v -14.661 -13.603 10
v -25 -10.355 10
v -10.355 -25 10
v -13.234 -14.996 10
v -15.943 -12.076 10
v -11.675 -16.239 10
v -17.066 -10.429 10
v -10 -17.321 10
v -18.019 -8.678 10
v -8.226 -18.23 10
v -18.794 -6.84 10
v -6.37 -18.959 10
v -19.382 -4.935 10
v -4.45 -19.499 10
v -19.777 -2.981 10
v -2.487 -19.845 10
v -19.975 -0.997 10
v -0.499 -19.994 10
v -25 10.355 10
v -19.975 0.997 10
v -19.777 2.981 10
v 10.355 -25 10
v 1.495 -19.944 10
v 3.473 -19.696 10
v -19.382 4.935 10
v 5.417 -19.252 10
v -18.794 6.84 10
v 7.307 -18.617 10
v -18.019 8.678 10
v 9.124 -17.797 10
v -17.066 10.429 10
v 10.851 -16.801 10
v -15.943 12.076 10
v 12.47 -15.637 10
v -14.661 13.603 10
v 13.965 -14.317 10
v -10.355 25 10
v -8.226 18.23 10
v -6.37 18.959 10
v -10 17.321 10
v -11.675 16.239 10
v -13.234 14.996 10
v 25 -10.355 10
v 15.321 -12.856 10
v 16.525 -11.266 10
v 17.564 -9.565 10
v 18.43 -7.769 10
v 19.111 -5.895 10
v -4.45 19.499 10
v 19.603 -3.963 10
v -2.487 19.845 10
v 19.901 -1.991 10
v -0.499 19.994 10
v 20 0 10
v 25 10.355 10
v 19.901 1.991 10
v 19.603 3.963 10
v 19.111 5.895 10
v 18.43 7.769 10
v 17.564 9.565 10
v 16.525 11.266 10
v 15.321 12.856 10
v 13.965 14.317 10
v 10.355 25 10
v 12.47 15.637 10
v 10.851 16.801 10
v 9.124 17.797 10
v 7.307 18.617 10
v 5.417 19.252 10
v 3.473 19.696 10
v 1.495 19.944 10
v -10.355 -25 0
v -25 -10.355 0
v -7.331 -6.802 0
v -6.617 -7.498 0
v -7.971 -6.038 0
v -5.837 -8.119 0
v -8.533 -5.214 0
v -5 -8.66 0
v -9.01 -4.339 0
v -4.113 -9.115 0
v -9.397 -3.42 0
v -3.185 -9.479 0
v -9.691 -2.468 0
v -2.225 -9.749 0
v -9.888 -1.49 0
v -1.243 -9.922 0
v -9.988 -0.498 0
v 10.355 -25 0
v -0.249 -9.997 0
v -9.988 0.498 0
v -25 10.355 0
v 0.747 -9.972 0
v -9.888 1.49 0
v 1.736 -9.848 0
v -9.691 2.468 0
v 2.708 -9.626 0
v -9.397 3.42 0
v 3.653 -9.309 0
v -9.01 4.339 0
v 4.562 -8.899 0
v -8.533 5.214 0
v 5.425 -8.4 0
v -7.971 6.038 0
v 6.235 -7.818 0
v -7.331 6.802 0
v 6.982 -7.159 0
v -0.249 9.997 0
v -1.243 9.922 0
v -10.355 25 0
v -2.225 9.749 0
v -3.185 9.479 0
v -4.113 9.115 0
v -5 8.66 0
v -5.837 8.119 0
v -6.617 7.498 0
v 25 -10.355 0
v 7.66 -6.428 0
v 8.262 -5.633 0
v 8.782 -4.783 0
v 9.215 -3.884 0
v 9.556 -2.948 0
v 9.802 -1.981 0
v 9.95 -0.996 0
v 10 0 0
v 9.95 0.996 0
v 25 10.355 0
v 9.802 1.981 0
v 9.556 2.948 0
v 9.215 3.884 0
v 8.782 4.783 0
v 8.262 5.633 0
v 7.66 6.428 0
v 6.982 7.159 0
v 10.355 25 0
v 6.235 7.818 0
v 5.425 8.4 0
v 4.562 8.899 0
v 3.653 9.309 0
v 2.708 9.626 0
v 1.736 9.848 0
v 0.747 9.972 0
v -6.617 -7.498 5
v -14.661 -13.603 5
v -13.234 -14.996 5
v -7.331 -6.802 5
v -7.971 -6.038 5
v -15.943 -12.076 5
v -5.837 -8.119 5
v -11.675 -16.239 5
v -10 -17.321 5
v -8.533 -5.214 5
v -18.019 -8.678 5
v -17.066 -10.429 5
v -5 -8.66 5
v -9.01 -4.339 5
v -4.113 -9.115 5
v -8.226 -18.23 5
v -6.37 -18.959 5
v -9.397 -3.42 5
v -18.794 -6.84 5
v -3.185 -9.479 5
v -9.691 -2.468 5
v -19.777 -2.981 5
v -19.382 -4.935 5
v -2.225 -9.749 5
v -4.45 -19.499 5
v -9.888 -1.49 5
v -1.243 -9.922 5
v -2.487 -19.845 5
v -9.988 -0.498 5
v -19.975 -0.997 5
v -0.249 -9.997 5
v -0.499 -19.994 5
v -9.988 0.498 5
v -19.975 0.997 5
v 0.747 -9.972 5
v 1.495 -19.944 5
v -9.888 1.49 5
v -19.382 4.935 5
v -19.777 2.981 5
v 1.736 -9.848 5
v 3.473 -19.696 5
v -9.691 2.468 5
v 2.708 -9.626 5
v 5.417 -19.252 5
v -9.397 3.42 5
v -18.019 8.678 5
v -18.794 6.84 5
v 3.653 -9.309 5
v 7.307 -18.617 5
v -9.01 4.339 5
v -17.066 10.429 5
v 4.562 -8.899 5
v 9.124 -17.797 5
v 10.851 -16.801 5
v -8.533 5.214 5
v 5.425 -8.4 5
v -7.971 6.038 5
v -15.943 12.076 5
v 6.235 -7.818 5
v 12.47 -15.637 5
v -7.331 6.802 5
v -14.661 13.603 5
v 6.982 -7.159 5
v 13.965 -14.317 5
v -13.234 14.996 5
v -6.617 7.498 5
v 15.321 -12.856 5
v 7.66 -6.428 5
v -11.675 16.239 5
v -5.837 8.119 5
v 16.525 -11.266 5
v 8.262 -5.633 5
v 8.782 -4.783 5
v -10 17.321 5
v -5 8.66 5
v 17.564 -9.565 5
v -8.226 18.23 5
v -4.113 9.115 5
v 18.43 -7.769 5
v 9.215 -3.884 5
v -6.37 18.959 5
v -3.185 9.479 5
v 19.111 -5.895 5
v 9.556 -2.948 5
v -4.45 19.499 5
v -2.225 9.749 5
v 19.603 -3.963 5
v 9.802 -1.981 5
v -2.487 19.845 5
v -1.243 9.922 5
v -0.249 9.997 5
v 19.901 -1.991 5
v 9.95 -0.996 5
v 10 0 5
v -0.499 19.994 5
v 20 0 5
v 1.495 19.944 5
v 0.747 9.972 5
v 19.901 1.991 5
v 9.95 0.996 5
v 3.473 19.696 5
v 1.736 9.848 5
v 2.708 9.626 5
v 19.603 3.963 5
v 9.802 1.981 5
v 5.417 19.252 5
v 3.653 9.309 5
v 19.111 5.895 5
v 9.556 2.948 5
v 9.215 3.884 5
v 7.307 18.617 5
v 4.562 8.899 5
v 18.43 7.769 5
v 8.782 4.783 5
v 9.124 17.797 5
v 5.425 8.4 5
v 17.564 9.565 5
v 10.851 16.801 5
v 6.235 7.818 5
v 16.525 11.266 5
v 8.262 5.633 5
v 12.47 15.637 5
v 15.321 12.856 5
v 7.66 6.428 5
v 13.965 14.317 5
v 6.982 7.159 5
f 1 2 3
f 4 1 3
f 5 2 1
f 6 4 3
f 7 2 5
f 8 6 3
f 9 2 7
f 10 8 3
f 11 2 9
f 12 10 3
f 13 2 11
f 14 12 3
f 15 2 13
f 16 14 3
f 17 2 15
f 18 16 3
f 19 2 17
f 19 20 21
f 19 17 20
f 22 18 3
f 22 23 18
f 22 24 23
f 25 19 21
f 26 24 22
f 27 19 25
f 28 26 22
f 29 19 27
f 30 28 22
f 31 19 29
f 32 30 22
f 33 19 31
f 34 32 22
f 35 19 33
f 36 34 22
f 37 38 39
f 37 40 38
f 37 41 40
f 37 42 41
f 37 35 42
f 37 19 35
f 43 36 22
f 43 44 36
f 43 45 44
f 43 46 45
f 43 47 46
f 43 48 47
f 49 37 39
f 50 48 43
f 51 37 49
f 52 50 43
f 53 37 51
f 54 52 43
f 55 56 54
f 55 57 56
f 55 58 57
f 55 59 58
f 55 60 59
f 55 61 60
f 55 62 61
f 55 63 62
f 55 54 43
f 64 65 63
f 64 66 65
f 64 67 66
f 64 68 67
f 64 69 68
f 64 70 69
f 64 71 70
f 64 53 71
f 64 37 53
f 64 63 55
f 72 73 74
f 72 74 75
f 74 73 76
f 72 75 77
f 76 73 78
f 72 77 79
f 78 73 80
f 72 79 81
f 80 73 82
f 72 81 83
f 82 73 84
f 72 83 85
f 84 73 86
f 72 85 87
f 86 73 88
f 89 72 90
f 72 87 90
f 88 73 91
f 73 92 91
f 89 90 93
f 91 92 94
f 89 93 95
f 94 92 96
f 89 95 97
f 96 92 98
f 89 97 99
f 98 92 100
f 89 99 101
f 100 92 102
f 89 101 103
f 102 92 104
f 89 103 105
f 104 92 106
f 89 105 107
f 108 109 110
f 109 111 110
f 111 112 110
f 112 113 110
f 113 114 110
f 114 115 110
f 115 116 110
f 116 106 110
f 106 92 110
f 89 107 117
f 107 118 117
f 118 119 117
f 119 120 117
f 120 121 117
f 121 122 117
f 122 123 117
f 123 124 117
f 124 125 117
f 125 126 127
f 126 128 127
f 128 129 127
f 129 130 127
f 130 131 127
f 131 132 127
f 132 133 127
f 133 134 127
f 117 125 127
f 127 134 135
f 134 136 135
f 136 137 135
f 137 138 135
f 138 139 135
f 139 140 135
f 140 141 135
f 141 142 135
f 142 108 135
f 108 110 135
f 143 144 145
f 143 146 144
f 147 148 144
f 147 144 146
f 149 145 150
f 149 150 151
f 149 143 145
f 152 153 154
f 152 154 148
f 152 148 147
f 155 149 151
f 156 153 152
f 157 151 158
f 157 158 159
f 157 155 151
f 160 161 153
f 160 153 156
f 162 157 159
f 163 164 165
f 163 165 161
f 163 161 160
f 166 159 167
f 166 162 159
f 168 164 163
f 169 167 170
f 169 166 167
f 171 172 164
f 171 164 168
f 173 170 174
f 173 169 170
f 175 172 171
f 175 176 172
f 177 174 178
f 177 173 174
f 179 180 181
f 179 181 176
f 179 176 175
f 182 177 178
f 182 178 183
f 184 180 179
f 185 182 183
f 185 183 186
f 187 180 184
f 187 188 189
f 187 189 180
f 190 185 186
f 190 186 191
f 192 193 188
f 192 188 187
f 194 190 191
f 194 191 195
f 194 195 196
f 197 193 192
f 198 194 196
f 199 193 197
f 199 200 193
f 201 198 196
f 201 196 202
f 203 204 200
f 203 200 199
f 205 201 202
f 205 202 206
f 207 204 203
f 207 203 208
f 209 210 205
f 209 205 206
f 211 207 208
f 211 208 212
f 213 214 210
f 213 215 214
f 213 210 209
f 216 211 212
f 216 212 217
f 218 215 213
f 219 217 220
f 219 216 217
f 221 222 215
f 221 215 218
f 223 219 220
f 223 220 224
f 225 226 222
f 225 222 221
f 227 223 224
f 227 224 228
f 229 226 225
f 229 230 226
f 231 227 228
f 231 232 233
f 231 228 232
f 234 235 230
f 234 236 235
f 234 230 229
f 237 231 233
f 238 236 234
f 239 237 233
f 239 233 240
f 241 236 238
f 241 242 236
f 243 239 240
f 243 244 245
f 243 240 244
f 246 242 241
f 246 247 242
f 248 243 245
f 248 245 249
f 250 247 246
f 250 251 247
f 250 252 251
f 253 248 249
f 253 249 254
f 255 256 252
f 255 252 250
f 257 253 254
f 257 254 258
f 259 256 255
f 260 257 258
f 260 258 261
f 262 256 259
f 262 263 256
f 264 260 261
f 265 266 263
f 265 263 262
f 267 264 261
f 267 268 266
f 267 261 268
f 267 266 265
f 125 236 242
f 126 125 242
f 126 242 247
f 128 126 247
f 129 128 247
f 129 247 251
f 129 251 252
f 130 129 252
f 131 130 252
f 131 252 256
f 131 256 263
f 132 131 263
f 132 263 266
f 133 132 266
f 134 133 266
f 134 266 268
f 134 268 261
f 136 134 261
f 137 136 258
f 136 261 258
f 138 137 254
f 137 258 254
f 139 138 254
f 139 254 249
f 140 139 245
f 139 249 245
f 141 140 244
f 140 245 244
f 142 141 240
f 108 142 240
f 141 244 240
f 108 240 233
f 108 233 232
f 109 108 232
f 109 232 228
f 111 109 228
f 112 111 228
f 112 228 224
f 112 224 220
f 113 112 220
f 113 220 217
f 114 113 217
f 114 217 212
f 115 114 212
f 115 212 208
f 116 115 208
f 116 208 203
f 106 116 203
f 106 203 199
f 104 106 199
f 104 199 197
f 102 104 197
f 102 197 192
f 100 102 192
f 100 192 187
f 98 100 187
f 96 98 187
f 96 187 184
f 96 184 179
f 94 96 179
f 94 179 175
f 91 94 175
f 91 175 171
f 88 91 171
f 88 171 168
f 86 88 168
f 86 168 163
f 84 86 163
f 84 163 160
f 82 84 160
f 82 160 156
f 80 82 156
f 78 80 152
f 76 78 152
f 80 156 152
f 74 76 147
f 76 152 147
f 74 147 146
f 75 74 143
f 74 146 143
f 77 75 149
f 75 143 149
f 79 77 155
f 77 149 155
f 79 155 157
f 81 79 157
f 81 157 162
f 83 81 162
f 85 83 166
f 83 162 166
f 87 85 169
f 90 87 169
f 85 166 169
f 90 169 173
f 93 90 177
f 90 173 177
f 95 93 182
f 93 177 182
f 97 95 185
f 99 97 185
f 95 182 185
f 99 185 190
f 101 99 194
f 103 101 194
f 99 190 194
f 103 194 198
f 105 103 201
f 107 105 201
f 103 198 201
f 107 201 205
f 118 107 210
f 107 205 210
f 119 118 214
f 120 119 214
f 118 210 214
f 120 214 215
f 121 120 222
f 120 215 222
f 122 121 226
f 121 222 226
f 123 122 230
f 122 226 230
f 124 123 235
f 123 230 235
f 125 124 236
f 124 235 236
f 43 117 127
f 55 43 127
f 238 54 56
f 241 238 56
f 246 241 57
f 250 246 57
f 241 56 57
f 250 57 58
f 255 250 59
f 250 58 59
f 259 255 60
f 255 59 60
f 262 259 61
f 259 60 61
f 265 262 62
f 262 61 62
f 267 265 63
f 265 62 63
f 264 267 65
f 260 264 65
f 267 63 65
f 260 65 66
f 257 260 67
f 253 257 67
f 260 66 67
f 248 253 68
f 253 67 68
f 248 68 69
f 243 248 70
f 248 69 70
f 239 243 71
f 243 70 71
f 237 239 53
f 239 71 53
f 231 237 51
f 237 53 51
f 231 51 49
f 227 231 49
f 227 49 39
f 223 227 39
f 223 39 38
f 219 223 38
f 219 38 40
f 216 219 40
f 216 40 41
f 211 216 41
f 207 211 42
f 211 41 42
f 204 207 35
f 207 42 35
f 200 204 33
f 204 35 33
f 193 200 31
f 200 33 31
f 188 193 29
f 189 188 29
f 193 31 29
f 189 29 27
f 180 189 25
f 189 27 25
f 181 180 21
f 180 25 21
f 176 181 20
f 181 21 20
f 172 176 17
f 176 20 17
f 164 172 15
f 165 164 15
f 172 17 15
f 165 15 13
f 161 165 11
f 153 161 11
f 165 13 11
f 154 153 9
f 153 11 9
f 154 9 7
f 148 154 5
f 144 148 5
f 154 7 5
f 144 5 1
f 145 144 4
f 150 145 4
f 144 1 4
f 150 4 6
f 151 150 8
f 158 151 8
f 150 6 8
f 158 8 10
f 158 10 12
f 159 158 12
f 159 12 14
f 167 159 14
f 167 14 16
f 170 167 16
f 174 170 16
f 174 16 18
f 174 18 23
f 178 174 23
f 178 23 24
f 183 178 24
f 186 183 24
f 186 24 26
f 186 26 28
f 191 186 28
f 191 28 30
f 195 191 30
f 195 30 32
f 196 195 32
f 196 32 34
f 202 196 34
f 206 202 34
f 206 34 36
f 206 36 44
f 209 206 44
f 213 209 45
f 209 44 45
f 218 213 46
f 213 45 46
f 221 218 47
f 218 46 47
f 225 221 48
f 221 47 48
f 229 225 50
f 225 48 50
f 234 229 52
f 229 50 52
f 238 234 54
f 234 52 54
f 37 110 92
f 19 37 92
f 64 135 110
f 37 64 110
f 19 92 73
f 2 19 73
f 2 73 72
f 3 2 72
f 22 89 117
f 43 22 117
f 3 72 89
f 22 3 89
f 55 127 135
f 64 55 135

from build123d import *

# Parameters (mm, degrees)
F1_DEPTH = 10
F2_R     = 20
F3_DEPTH = 5
F4_R     = 10
F5_DEPTH = 25


with BuildPart() as f1:
    # F0 (on Top) → F1 (new body)
    with BuildSketch(Plane.XY):
        Polygon((25, -10.355339), (25, 10.355339), (10.355339, 25), (-10.355339, 25), (-25, 10.355339), (-25, -10.355339), (-10.355339, -25), (10.355339, -25), align=None)
    extrude(amount=F1_DEPTH)

    # F2 (on face) → F3 (cut)
    with BuildSketch(Plane.XY.offset(10)):
        Circle(F2_R)
    extrude(amount=-F3_DEPTH, mode=Mode.SUBTRACT)

    # F4 (on face) → F5 (cut)
    with BuildSketch(Plane.XY.offset(10)):
        Circle(F4_R)
    extrude(amount=-F5_DEPTH, mode=Mode.SUBTRACT)


solid = f1.part
